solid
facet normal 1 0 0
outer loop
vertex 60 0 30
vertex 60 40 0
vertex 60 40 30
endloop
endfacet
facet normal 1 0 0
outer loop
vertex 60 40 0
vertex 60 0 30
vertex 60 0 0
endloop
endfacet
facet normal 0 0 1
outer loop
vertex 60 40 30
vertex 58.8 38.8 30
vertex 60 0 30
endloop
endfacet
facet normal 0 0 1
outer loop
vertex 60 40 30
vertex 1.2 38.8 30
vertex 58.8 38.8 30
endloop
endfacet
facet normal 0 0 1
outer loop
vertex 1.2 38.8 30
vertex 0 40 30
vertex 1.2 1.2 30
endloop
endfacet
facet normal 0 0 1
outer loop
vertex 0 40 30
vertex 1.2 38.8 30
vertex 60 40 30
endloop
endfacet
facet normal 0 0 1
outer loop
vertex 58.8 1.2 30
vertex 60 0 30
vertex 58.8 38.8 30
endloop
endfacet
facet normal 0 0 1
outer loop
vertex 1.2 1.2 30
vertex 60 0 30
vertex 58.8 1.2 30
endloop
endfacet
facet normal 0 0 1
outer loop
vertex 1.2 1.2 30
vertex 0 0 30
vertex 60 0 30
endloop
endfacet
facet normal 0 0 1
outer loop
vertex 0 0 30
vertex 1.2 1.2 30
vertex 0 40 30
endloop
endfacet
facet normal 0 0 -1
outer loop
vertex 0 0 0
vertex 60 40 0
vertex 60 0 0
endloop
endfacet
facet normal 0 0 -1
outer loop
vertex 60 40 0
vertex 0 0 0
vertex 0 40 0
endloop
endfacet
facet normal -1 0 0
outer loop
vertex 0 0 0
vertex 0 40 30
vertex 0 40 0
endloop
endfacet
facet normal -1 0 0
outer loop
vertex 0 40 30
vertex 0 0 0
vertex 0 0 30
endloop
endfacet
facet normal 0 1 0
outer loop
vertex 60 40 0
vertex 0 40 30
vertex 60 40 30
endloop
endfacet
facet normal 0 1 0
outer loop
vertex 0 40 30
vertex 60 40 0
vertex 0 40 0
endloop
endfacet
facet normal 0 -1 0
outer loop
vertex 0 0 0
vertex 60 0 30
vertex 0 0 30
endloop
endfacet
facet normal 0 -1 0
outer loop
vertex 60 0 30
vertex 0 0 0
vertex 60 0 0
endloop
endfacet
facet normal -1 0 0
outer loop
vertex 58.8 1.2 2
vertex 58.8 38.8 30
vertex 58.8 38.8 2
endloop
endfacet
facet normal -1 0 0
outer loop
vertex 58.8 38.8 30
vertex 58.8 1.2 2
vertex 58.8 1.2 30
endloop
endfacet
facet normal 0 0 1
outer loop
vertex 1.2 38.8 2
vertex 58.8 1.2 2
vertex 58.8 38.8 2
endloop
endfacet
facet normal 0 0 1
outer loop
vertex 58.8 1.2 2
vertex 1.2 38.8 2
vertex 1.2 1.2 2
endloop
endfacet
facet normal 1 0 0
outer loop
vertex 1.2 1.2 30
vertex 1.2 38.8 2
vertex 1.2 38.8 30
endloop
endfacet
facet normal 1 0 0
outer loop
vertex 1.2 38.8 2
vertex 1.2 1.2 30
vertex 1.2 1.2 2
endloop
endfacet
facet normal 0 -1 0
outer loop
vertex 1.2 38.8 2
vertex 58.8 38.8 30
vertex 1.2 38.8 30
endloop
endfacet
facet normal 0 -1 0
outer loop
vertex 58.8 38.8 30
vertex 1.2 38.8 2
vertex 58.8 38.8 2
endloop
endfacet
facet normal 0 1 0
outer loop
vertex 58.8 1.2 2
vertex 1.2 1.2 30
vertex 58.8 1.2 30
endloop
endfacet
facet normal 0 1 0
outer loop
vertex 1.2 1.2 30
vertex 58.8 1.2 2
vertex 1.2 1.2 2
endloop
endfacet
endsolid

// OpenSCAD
$fn = 32;

// ----------------------------------------------------------------------
// Open box: 1.2 mm walls
// ----------------------------------------------------------------------

// --- parameters (mm) ---
box_l = 60;               // outer length, X
box_w = 40;               // outer width, Y
box_h = 30;               // outer height, Z
wall = 1.2;               // wall thickness
floor = 2;                // floor thickness

difference() {
  cube([box_l, box_w, box_h]);
  translate([wall, wall, floor])
    cube([box_l - 2 * wall, box_w - 2 * wall, box_h]);
}
